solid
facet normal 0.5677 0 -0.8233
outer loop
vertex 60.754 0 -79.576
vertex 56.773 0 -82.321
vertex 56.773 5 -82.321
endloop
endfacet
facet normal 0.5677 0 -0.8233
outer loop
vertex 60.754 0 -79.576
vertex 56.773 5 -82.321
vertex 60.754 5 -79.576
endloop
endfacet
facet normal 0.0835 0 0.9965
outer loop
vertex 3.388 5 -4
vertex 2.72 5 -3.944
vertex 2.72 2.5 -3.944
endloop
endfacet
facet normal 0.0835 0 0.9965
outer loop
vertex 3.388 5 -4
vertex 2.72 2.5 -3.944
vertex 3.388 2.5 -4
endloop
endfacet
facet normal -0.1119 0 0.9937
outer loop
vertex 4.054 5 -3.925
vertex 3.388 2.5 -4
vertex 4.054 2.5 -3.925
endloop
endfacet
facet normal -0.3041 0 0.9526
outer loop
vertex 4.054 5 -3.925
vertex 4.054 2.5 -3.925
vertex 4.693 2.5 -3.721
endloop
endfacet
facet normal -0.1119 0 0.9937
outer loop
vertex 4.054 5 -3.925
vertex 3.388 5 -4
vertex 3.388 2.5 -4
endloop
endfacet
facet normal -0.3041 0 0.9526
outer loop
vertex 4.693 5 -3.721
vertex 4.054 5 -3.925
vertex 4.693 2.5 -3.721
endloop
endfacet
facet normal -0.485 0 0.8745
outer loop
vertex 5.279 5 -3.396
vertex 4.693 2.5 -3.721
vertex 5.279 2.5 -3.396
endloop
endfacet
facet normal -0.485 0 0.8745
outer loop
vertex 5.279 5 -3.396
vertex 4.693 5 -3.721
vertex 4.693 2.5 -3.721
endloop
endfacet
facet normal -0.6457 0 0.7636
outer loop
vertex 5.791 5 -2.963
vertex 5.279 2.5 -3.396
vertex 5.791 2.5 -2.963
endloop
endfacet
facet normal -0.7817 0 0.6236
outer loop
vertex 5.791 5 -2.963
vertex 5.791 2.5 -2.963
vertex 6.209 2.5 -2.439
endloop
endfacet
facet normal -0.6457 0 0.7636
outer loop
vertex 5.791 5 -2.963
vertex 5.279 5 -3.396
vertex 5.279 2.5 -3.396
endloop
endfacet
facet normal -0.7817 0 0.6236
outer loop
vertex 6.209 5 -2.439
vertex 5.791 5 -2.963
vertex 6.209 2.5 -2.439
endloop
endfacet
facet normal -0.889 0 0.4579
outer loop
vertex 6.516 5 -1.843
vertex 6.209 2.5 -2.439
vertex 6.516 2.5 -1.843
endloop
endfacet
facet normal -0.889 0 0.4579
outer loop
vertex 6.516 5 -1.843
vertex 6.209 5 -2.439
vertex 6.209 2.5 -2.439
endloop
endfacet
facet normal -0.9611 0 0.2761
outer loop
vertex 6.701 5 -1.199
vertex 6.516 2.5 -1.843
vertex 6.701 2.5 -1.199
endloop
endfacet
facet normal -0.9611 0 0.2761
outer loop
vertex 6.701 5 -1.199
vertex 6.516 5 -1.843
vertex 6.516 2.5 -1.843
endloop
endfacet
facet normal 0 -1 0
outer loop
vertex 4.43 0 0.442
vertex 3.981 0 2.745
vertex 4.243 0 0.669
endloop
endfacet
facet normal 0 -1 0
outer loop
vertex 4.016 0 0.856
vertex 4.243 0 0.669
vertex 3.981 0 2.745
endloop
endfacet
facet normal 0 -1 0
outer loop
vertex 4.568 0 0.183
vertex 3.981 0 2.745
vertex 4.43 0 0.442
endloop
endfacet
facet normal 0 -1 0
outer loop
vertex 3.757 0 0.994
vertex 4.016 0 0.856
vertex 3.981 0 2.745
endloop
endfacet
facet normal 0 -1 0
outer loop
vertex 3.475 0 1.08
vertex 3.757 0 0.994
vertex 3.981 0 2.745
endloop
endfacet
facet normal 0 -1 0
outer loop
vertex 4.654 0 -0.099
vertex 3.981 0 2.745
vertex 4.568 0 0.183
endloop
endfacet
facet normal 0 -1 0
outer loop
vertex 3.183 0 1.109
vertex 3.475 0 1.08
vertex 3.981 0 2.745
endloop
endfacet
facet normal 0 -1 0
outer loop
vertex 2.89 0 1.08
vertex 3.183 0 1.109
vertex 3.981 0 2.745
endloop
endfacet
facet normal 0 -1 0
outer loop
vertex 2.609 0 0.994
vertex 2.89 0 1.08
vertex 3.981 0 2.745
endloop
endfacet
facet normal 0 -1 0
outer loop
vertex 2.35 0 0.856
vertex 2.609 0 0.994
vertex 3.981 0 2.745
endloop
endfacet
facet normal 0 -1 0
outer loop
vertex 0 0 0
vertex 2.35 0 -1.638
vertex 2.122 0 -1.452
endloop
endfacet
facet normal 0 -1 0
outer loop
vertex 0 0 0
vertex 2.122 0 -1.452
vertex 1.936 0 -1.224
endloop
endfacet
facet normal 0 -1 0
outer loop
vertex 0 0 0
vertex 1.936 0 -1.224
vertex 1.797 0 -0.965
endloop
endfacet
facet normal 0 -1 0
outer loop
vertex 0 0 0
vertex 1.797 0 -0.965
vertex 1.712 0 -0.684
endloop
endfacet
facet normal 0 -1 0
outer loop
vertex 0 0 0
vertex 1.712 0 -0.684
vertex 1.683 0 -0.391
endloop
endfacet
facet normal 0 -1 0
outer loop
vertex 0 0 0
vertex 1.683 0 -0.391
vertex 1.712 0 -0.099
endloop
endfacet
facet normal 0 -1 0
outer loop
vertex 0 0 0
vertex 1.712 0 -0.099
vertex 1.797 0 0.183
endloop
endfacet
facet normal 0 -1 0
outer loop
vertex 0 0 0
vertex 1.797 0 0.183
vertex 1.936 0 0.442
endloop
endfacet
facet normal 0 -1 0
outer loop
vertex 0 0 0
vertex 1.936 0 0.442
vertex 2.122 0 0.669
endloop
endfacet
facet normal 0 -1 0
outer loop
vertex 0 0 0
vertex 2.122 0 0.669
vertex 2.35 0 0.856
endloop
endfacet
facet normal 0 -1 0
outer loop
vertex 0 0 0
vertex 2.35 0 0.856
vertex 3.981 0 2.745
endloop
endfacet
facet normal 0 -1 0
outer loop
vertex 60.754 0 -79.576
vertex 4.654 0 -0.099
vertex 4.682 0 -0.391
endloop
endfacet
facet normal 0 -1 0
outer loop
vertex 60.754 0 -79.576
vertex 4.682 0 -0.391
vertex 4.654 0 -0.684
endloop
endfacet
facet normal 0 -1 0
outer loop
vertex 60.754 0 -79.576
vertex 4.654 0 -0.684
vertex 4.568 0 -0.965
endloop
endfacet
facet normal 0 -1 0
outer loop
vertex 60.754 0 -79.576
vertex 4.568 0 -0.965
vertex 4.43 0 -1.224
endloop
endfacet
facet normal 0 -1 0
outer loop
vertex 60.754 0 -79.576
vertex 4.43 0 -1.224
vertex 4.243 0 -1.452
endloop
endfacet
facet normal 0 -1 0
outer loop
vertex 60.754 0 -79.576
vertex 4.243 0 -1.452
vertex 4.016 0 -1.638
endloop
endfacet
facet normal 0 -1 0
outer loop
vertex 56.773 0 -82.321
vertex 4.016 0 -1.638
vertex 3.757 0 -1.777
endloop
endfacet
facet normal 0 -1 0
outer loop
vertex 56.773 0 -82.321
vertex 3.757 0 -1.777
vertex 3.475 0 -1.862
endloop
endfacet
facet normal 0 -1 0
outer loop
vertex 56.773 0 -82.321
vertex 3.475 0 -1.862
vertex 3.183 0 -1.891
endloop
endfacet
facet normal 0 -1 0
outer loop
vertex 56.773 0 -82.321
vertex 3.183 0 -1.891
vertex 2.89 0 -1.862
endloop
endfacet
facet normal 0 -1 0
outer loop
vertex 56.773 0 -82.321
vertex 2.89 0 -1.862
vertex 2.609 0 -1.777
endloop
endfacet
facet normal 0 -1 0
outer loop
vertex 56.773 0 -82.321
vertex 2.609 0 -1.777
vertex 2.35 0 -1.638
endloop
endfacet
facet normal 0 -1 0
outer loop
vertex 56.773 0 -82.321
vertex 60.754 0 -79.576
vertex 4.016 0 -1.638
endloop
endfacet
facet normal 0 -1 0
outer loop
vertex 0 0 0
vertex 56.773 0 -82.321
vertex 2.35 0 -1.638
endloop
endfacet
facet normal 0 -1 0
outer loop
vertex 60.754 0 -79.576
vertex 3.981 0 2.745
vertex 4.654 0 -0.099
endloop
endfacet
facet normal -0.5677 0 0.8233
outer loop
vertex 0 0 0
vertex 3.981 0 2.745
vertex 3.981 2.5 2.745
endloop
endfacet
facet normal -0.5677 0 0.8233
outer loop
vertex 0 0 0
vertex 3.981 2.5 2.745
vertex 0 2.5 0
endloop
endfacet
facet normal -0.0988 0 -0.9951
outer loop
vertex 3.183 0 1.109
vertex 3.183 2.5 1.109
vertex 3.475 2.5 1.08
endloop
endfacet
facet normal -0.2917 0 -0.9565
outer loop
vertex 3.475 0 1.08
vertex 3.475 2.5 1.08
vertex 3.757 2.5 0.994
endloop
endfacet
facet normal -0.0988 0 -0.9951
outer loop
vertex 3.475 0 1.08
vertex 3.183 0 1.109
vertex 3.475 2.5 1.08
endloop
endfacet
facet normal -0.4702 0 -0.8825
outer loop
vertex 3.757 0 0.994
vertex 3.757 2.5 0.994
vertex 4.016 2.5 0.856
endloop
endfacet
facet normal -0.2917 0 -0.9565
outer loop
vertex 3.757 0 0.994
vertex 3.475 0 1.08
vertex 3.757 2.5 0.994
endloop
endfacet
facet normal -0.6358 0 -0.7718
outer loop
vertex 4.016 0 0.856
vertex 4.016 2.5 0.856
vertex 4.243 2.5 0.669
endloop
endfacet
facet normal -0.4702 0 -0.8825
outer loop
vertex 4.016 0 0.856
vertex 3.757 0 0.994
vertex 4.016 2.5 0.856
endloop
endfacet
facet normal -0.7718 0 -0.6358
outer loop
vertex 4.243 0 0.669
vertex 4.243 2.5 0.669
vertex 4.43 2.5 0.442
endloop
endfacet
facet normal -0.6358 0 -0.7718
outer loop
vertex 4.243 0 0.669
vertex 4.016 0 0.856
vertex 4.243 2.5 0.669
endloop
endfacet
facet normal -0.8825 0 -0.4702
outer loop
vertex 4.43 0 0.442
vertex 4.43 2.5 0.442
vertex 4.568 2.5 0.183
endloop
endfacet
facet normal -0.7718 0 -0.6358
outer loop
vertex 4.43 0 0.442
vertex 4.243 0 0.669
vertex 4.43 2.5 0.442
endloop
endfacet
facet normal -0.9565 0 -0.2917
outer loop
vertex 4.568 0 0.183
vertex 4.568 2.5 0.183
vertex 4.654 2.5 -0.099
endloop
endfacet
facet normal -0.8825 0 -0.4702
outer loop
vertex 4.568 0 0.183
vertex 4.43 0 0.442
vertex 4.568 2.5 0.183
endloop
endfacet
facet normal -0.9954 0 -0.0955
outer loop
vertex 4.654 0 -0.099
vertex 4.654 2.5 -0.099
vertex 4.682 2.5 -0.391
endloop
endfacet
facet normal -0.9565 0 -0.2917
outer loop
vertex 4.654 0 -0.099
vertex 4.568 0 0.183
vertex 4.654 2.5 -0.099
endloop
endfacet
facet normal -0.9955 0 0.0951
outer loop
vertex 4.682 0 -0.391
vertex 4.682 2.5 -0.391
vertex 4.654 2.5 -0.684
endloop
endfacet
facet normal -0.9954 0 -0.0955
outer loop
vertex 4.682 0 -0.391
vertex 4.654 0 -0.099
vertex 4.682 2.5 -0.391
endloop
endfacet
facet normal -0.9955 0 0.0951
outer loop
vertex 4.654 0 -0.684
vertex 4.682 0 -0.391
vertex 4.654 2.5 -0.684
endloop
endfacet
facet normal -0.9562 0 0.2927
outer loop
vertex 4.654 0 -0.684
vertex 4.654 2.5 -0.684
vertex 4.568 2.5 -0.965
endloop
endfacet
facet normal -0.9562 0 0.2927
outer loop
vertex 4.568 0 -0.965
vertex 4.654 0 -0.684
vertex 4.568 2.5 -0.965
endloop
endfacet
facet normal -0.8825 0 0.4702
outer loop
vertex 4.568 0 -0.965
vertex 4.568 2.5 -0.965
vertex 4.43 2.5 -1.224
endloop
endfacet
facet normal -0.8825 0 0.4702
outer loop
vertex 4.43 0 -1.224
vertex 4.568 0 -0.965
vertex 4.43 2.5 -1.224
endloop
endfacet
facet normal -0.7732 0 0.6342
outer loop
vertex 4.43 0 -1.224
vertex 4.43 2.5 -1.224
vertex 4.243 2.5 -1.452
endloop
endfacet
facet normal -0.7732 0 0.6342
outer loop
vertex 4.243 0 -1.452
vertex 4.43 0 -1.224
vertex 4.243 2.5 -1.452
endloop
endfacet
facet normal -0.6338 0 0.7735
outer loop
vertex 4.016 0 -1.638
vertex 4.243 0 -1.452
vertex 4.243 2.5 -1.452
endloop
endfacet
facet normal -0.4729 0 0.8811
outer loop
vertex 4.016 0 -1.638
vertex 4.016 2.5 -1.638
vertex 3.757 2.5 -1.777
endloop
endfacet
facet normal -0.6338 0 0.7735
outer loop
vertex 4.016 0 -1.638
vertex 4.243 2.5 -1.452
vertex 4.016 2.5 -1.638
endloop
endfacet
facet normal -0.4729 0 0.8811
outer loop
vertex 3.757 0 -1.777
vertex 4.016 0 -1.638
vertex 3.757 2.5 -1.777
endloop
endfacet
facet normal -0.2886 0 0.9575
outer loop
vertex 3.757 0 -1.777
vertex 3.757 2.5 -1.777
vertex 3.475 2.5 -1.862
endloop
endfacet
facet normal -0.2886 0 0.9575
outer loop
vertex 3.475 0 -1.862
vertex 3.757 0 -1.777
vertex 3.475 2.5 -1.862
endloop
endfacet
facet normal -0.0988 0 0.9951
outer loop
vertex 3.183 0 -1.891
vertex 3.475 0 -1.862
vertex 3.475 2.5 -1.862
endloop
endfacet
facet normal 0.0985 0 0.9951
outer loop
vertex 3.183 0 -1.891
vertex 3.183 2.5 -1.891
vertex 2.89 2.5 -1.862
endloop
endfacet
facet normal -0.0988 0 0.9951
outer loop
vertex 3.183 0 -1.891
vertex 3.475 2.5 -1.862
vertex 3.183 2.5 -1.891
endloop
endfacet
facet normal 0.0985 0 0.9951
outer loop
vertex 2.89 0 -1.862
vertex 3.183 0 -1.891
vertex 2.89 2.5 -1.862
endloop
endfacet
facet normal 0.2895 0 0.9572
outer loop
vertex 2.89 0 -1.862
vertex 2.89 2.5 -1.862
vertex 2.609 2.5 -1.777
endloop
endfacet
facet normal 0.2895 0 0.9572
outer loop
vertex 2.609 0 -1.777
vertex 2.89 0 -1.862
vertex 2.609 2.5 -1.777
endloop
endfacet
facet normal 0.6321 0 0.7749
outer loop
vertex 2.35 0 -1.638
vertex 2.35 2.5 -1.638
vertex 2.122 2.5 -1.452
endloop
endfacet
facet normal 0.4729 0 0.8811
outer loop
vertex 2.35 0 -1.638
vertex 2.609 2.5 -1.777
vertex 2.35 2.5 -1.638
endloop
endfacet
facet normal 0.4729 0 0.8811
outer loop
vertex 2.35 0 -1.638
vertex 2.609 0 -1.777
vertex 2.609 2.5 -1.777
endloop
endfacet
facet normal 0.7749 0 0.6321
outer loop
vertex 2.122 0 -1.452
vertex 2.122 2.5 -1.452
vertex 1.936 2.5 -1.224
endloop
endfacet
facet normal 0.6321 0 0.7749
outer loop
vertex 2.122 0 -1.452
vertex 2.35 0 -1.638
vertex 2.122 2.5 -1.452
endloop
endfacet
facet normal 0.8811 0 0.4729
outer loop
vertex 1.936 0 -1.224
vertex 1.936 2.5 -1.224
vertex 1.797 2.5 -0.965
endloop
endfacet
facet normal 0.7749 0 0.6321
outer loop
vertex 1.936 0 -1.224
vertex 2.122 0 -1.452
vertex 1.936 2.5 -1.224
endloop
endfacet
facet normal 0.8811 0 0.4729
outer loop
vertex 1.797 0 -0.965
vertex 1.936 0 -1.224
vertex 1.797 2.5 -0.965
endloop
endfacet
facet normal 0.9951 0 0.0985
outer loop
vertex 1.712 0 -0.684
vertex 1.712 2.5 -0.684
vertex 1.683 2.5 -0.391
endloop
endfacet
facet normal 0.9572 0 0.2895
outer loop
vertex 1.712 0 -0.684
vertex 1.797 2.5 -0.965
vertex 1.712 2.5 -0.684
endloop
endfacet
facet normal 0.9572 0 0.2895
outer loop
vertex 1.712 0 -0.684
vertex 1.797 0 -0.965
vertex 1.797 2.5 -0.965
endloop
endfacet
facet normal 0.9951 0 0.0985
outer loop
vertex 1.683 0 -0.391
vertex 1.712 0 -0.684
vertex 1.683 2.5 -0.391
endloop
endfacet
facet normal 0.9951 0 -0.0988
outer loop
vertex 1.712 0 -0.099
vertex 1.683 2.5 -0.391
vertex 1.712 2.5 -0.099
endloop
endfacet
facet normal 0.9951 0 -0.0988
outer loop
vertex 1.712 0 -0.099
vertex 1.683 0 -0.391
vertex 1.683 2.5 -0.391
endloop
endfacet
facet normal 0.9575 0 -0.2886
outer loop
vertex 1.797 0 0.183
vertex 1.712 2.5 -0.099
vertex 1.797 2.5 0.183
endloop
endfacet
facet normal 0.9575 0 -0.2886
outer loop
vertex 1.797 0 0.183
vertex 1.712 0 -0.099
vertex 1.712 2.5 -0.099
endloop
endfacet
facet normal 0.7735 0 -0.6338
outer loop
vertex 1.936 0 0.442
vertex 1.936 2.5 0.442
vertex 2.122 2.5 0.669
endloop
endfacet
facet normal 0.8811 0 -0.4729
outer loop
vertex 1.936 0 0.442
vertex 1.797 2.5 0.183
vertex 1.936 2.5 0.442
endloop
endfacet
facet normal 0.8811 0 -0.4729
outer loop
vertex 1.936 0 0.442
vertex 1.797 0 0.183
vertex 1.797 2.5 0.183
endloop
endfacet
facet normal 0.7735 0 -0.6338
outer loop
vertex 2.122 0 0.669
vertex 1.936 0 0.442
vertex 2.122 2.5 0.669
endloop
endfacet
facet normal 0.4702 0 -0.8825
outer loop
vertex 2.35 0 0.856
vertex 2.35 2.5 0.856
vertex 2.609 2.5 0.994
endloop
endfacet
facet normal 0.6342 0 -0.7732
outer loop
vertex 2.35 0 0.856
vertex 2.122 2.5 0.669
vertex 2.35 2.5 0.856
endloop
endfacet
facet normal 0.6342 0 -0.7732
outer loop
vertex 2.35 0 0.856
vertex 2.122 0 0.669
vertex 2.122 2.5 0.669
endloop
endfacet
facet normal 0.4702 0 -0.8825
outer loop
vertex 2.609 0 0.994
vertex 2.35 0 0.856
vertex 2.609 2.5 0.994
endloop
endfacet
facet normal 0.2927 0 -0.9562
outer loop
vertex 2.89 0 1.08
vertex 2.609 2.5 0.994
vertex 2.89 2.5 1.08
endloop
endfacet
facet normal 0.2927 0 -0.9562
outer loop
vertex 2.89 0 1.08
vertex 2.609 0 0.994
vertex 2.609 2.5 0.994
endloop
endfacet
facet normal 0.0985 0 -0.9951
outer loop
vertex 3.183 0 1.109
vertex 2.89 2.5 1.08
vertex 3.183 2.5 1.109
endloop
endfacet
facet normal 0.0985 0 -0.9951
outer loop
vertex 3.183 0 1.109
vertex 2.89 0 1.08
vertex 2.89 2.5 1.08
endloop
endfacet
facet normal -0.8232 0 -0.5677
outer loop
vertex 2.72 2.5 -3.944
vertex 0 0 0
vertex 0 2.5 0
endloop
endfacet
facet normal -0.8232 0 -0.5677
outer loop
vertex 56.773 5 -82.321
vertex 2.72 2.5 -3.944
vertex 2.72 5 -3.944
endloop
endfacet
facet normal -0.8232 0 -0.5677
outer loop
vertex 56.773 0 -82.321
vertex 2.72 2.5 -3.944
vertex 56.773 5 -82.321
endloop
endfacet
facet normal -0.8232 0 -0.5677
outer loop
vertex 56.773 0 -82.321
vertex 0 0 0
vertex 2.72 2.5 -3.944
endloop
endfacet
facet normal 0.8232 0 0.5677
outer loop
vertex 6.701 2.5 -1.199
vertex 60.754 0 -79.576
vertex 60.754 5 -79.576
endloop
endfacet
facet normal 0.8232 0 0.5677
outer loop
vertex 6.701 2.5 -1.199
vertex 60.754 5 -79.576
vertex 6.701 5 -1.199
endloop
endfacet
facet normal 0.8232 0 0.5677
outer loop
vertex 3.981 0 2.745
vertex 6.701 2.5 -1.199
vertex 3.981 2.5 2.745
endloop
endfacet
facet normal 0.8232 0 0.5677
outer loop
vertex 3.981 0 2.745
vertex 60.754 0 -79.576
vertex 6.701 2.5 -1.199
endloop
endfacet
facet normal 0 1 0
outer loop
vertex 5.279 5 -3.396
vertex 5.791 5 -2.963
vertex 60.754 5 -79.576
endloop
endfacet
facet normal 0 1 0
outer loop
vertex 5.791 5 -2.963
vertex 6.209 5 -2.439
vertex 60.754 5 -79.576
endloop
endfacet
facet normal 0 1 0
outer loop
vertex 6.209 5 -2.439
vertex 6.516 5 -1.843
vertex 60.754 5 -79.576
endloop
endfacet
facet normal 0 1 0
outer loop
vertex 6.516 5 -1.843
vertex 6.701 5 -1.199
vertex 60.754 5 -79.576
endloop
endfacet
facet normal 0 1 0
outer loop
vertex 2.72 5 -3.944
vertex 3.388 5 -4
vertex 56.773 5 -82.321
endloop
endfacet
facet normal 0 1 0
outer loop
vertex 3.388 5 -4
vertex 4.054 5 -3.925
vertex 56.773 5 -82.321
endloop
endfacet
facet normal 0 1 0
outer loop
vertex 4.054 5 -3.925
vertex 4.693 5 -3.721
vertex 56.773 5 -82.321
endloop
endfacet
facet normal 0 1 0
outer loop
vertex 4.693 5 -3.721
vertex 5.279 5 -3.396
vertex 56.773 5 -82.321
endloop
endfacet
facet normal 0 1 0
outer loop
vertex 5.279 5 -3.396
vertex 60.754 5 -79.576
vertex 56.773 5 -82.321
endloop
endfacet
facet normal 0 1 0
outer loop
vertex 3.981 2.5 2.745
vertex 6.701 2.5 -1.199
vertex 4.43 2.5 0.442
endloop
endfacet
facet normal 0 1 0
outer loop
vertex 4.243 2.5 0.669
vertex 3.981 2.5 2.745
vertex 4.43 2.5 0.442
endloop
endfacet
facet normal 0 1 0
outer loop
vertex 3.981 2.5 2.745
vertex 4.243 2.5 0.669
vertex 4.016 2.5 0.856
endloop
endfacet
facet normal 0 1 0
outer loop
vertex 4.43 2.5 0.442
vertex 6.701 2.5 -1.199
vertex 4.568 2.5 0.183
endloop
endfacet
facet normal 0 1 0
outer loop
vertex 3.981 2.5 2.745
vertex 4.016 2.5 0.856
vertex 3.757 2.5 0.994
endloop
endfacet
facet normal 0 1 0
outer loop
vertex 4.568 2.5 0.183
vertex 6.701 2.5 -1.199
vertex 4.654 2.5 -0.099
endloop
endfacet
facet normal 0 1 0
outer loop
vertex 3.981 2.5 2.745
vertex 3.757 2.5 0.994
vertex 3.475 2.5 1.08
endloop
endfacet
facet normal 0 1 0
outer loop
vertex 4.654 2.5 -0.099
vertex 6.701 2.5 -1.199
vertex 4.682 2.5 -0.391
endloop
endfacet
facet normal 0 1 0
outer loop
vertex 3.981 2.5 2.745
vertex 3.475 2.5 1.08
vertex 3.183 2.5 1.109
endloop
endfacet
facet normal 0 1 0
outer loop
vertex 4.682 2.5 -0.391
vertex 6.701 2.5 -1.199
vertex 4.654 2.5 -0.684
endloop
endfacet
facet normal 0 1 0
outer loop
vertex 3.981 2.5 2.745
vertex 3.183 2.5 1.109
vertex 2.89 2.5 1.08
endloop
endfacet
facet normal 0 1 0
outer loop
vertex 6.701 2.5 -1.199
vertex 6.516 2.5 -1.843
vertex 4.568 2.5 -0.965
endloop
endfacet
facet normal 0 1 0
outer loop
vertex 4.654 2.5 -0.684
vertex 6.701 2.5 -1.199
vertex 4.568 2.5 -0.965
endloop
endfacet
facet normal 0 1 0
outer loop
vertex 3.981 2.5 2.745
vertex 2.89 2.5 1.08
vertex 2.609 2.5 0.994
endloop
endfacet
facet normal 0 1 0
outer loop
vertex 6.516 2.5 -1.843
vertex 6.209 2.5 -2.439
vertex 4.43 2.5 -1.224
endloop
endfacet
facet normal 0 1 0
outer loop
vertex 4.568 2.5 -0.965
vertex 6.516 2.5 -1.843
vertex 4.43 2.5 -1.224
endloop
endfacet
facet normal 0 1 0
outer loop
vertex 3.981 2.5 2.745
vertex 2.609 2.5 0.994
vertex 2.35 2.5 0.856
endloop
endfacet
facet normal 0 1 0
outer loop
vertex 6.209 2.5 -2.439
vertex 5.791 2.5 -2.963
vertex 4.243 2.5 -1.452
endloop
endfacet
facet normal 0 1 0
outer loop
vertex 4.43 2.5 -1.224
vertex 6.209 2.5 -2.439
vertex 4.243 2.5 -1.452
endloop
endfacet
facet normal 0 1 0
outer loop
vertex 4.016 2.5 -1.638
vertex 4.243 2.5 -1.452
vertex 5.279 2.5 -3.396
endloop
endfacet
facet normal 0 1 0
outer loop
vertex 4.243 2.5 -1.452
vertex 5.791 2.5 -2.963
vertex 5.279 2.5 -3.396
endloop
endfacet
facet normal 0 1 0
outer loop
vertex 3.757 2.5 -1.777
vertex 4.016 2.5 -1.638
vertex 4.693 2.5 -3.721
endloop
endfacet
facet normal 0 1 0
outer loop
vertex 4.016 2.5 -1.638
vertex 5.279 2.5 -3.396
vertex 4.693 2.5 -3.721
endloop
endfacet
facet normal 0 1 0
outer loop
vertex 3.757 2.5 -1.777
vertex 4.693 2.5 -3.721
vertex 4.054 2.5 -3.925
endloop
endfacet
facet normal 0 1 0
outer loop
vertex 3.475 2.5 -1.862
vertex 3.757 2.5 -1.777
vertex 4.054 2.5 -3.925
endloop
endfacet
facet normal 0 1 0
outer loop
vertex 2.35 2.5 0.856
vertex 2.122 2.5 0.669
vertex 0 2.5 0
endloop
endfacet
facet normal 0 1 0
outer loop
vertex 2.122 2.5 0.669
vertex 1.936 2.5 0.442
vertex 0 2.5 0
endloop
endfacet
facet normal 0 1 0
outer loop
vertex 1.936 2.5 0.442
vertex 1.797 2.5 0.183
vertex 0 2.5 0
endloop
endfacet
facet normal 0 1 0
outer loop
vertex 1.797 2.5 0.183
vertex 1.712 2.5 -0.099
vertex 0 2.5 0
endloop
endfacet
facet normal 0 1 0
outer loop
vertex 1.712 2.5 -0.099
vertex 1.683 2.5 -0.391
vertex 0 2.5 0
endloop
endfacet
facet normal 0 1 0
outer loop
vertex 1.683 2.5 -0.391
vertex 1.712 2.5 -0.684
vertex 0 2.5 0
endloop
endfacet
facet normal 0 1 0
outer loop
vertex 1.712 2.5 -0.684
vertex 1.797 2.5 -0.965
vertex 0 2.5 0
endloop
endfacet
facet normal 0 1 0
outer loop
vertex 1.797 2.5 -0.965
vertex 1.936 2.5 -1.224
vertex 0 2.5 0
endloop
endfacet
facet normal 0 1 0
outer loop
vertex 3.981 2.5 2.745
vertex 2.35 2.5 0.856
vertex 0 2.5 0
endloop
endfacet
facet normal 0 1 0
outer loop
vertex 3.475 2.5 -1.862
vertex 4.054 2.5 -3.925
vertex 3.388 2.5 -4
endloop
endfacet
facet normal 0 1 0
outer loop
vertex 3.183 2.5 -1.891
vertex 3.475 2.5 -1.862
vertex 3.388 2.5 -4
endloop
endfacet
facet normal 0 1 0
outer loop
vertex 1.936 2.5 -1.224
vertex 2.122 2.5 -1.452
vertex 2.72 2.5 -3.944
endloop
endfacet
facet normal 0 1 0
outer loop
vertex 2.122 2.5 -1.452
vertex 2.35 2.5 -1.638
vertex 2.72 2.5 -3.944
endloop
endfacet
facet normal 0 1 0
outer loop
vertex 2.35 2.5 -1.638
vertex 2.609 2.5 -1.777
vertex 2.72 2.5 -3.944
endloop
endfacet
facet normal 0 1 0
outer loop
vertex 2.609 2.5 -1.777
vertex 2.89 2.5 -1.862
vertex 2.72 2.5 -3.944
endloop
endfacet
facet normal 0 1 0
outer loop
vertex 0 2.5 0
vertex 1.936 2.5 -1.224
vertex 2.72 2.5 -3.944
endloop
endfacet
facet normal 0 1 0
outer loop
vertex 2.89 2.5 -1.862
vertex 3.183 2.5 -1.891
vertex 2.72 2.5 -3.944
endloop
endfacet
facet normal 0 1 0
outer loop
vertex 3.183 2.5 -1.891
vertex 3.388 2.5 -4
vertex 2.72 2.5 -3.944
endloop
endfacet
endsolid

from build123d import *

# Parameters (mm, degrees)
SKETCH1_R           = 1.499690954
BOSS_EXTRUDE2_DEPTH = 5
CUT_EXTRUDE3_DEPTH  = 2.5


with BuildPart() as part:
    # Sketch1 → Boss-Extrude2 (new body)
    with BuildSketch(Plane(origin=(0, 0, 0), x_dir=(1, 0, 0), z_dir=(0, 1, 0))):
        Polygon((0, 0), (56.773285815, 82.321285326), (60.754153273, 79.57586019), (3.980867458, -2.745425136), align=None)
        with Locations(Location((3.182714522, 0.391186569, 0), (0, 0, 270))):
            Circle(SKETCH1_R, mode=Mode.SUBTRACT)
    extrude(amount=BOSS_EXTRUDE2_DEPTH)

    # Sketch2 → Cut-Extrude3 (cut)
    with BuildSketch(Plane(origin=(0, 5, 0), x_dir=(1, 0, 0), z_dir=(0, 1, 0))):
        with BuildLine():
            Line((6.700962503, 1.19871368), (3.980867458, -2.745425136))
            Line((3.980867458, -2.745425136), (0, 0))
            Line((0, 0), (2.720095045, 3.944138817))
            ThreePointArc((2.720095045, 3.944138817), (5.279124937, 3.395890894), (6.700962503, 1.19871368))
        make_face()
    extrude(amount=-CUT_EXTRUDE3_DEPTH, mode=Mode.SUBTRACT)


solid = part.part
